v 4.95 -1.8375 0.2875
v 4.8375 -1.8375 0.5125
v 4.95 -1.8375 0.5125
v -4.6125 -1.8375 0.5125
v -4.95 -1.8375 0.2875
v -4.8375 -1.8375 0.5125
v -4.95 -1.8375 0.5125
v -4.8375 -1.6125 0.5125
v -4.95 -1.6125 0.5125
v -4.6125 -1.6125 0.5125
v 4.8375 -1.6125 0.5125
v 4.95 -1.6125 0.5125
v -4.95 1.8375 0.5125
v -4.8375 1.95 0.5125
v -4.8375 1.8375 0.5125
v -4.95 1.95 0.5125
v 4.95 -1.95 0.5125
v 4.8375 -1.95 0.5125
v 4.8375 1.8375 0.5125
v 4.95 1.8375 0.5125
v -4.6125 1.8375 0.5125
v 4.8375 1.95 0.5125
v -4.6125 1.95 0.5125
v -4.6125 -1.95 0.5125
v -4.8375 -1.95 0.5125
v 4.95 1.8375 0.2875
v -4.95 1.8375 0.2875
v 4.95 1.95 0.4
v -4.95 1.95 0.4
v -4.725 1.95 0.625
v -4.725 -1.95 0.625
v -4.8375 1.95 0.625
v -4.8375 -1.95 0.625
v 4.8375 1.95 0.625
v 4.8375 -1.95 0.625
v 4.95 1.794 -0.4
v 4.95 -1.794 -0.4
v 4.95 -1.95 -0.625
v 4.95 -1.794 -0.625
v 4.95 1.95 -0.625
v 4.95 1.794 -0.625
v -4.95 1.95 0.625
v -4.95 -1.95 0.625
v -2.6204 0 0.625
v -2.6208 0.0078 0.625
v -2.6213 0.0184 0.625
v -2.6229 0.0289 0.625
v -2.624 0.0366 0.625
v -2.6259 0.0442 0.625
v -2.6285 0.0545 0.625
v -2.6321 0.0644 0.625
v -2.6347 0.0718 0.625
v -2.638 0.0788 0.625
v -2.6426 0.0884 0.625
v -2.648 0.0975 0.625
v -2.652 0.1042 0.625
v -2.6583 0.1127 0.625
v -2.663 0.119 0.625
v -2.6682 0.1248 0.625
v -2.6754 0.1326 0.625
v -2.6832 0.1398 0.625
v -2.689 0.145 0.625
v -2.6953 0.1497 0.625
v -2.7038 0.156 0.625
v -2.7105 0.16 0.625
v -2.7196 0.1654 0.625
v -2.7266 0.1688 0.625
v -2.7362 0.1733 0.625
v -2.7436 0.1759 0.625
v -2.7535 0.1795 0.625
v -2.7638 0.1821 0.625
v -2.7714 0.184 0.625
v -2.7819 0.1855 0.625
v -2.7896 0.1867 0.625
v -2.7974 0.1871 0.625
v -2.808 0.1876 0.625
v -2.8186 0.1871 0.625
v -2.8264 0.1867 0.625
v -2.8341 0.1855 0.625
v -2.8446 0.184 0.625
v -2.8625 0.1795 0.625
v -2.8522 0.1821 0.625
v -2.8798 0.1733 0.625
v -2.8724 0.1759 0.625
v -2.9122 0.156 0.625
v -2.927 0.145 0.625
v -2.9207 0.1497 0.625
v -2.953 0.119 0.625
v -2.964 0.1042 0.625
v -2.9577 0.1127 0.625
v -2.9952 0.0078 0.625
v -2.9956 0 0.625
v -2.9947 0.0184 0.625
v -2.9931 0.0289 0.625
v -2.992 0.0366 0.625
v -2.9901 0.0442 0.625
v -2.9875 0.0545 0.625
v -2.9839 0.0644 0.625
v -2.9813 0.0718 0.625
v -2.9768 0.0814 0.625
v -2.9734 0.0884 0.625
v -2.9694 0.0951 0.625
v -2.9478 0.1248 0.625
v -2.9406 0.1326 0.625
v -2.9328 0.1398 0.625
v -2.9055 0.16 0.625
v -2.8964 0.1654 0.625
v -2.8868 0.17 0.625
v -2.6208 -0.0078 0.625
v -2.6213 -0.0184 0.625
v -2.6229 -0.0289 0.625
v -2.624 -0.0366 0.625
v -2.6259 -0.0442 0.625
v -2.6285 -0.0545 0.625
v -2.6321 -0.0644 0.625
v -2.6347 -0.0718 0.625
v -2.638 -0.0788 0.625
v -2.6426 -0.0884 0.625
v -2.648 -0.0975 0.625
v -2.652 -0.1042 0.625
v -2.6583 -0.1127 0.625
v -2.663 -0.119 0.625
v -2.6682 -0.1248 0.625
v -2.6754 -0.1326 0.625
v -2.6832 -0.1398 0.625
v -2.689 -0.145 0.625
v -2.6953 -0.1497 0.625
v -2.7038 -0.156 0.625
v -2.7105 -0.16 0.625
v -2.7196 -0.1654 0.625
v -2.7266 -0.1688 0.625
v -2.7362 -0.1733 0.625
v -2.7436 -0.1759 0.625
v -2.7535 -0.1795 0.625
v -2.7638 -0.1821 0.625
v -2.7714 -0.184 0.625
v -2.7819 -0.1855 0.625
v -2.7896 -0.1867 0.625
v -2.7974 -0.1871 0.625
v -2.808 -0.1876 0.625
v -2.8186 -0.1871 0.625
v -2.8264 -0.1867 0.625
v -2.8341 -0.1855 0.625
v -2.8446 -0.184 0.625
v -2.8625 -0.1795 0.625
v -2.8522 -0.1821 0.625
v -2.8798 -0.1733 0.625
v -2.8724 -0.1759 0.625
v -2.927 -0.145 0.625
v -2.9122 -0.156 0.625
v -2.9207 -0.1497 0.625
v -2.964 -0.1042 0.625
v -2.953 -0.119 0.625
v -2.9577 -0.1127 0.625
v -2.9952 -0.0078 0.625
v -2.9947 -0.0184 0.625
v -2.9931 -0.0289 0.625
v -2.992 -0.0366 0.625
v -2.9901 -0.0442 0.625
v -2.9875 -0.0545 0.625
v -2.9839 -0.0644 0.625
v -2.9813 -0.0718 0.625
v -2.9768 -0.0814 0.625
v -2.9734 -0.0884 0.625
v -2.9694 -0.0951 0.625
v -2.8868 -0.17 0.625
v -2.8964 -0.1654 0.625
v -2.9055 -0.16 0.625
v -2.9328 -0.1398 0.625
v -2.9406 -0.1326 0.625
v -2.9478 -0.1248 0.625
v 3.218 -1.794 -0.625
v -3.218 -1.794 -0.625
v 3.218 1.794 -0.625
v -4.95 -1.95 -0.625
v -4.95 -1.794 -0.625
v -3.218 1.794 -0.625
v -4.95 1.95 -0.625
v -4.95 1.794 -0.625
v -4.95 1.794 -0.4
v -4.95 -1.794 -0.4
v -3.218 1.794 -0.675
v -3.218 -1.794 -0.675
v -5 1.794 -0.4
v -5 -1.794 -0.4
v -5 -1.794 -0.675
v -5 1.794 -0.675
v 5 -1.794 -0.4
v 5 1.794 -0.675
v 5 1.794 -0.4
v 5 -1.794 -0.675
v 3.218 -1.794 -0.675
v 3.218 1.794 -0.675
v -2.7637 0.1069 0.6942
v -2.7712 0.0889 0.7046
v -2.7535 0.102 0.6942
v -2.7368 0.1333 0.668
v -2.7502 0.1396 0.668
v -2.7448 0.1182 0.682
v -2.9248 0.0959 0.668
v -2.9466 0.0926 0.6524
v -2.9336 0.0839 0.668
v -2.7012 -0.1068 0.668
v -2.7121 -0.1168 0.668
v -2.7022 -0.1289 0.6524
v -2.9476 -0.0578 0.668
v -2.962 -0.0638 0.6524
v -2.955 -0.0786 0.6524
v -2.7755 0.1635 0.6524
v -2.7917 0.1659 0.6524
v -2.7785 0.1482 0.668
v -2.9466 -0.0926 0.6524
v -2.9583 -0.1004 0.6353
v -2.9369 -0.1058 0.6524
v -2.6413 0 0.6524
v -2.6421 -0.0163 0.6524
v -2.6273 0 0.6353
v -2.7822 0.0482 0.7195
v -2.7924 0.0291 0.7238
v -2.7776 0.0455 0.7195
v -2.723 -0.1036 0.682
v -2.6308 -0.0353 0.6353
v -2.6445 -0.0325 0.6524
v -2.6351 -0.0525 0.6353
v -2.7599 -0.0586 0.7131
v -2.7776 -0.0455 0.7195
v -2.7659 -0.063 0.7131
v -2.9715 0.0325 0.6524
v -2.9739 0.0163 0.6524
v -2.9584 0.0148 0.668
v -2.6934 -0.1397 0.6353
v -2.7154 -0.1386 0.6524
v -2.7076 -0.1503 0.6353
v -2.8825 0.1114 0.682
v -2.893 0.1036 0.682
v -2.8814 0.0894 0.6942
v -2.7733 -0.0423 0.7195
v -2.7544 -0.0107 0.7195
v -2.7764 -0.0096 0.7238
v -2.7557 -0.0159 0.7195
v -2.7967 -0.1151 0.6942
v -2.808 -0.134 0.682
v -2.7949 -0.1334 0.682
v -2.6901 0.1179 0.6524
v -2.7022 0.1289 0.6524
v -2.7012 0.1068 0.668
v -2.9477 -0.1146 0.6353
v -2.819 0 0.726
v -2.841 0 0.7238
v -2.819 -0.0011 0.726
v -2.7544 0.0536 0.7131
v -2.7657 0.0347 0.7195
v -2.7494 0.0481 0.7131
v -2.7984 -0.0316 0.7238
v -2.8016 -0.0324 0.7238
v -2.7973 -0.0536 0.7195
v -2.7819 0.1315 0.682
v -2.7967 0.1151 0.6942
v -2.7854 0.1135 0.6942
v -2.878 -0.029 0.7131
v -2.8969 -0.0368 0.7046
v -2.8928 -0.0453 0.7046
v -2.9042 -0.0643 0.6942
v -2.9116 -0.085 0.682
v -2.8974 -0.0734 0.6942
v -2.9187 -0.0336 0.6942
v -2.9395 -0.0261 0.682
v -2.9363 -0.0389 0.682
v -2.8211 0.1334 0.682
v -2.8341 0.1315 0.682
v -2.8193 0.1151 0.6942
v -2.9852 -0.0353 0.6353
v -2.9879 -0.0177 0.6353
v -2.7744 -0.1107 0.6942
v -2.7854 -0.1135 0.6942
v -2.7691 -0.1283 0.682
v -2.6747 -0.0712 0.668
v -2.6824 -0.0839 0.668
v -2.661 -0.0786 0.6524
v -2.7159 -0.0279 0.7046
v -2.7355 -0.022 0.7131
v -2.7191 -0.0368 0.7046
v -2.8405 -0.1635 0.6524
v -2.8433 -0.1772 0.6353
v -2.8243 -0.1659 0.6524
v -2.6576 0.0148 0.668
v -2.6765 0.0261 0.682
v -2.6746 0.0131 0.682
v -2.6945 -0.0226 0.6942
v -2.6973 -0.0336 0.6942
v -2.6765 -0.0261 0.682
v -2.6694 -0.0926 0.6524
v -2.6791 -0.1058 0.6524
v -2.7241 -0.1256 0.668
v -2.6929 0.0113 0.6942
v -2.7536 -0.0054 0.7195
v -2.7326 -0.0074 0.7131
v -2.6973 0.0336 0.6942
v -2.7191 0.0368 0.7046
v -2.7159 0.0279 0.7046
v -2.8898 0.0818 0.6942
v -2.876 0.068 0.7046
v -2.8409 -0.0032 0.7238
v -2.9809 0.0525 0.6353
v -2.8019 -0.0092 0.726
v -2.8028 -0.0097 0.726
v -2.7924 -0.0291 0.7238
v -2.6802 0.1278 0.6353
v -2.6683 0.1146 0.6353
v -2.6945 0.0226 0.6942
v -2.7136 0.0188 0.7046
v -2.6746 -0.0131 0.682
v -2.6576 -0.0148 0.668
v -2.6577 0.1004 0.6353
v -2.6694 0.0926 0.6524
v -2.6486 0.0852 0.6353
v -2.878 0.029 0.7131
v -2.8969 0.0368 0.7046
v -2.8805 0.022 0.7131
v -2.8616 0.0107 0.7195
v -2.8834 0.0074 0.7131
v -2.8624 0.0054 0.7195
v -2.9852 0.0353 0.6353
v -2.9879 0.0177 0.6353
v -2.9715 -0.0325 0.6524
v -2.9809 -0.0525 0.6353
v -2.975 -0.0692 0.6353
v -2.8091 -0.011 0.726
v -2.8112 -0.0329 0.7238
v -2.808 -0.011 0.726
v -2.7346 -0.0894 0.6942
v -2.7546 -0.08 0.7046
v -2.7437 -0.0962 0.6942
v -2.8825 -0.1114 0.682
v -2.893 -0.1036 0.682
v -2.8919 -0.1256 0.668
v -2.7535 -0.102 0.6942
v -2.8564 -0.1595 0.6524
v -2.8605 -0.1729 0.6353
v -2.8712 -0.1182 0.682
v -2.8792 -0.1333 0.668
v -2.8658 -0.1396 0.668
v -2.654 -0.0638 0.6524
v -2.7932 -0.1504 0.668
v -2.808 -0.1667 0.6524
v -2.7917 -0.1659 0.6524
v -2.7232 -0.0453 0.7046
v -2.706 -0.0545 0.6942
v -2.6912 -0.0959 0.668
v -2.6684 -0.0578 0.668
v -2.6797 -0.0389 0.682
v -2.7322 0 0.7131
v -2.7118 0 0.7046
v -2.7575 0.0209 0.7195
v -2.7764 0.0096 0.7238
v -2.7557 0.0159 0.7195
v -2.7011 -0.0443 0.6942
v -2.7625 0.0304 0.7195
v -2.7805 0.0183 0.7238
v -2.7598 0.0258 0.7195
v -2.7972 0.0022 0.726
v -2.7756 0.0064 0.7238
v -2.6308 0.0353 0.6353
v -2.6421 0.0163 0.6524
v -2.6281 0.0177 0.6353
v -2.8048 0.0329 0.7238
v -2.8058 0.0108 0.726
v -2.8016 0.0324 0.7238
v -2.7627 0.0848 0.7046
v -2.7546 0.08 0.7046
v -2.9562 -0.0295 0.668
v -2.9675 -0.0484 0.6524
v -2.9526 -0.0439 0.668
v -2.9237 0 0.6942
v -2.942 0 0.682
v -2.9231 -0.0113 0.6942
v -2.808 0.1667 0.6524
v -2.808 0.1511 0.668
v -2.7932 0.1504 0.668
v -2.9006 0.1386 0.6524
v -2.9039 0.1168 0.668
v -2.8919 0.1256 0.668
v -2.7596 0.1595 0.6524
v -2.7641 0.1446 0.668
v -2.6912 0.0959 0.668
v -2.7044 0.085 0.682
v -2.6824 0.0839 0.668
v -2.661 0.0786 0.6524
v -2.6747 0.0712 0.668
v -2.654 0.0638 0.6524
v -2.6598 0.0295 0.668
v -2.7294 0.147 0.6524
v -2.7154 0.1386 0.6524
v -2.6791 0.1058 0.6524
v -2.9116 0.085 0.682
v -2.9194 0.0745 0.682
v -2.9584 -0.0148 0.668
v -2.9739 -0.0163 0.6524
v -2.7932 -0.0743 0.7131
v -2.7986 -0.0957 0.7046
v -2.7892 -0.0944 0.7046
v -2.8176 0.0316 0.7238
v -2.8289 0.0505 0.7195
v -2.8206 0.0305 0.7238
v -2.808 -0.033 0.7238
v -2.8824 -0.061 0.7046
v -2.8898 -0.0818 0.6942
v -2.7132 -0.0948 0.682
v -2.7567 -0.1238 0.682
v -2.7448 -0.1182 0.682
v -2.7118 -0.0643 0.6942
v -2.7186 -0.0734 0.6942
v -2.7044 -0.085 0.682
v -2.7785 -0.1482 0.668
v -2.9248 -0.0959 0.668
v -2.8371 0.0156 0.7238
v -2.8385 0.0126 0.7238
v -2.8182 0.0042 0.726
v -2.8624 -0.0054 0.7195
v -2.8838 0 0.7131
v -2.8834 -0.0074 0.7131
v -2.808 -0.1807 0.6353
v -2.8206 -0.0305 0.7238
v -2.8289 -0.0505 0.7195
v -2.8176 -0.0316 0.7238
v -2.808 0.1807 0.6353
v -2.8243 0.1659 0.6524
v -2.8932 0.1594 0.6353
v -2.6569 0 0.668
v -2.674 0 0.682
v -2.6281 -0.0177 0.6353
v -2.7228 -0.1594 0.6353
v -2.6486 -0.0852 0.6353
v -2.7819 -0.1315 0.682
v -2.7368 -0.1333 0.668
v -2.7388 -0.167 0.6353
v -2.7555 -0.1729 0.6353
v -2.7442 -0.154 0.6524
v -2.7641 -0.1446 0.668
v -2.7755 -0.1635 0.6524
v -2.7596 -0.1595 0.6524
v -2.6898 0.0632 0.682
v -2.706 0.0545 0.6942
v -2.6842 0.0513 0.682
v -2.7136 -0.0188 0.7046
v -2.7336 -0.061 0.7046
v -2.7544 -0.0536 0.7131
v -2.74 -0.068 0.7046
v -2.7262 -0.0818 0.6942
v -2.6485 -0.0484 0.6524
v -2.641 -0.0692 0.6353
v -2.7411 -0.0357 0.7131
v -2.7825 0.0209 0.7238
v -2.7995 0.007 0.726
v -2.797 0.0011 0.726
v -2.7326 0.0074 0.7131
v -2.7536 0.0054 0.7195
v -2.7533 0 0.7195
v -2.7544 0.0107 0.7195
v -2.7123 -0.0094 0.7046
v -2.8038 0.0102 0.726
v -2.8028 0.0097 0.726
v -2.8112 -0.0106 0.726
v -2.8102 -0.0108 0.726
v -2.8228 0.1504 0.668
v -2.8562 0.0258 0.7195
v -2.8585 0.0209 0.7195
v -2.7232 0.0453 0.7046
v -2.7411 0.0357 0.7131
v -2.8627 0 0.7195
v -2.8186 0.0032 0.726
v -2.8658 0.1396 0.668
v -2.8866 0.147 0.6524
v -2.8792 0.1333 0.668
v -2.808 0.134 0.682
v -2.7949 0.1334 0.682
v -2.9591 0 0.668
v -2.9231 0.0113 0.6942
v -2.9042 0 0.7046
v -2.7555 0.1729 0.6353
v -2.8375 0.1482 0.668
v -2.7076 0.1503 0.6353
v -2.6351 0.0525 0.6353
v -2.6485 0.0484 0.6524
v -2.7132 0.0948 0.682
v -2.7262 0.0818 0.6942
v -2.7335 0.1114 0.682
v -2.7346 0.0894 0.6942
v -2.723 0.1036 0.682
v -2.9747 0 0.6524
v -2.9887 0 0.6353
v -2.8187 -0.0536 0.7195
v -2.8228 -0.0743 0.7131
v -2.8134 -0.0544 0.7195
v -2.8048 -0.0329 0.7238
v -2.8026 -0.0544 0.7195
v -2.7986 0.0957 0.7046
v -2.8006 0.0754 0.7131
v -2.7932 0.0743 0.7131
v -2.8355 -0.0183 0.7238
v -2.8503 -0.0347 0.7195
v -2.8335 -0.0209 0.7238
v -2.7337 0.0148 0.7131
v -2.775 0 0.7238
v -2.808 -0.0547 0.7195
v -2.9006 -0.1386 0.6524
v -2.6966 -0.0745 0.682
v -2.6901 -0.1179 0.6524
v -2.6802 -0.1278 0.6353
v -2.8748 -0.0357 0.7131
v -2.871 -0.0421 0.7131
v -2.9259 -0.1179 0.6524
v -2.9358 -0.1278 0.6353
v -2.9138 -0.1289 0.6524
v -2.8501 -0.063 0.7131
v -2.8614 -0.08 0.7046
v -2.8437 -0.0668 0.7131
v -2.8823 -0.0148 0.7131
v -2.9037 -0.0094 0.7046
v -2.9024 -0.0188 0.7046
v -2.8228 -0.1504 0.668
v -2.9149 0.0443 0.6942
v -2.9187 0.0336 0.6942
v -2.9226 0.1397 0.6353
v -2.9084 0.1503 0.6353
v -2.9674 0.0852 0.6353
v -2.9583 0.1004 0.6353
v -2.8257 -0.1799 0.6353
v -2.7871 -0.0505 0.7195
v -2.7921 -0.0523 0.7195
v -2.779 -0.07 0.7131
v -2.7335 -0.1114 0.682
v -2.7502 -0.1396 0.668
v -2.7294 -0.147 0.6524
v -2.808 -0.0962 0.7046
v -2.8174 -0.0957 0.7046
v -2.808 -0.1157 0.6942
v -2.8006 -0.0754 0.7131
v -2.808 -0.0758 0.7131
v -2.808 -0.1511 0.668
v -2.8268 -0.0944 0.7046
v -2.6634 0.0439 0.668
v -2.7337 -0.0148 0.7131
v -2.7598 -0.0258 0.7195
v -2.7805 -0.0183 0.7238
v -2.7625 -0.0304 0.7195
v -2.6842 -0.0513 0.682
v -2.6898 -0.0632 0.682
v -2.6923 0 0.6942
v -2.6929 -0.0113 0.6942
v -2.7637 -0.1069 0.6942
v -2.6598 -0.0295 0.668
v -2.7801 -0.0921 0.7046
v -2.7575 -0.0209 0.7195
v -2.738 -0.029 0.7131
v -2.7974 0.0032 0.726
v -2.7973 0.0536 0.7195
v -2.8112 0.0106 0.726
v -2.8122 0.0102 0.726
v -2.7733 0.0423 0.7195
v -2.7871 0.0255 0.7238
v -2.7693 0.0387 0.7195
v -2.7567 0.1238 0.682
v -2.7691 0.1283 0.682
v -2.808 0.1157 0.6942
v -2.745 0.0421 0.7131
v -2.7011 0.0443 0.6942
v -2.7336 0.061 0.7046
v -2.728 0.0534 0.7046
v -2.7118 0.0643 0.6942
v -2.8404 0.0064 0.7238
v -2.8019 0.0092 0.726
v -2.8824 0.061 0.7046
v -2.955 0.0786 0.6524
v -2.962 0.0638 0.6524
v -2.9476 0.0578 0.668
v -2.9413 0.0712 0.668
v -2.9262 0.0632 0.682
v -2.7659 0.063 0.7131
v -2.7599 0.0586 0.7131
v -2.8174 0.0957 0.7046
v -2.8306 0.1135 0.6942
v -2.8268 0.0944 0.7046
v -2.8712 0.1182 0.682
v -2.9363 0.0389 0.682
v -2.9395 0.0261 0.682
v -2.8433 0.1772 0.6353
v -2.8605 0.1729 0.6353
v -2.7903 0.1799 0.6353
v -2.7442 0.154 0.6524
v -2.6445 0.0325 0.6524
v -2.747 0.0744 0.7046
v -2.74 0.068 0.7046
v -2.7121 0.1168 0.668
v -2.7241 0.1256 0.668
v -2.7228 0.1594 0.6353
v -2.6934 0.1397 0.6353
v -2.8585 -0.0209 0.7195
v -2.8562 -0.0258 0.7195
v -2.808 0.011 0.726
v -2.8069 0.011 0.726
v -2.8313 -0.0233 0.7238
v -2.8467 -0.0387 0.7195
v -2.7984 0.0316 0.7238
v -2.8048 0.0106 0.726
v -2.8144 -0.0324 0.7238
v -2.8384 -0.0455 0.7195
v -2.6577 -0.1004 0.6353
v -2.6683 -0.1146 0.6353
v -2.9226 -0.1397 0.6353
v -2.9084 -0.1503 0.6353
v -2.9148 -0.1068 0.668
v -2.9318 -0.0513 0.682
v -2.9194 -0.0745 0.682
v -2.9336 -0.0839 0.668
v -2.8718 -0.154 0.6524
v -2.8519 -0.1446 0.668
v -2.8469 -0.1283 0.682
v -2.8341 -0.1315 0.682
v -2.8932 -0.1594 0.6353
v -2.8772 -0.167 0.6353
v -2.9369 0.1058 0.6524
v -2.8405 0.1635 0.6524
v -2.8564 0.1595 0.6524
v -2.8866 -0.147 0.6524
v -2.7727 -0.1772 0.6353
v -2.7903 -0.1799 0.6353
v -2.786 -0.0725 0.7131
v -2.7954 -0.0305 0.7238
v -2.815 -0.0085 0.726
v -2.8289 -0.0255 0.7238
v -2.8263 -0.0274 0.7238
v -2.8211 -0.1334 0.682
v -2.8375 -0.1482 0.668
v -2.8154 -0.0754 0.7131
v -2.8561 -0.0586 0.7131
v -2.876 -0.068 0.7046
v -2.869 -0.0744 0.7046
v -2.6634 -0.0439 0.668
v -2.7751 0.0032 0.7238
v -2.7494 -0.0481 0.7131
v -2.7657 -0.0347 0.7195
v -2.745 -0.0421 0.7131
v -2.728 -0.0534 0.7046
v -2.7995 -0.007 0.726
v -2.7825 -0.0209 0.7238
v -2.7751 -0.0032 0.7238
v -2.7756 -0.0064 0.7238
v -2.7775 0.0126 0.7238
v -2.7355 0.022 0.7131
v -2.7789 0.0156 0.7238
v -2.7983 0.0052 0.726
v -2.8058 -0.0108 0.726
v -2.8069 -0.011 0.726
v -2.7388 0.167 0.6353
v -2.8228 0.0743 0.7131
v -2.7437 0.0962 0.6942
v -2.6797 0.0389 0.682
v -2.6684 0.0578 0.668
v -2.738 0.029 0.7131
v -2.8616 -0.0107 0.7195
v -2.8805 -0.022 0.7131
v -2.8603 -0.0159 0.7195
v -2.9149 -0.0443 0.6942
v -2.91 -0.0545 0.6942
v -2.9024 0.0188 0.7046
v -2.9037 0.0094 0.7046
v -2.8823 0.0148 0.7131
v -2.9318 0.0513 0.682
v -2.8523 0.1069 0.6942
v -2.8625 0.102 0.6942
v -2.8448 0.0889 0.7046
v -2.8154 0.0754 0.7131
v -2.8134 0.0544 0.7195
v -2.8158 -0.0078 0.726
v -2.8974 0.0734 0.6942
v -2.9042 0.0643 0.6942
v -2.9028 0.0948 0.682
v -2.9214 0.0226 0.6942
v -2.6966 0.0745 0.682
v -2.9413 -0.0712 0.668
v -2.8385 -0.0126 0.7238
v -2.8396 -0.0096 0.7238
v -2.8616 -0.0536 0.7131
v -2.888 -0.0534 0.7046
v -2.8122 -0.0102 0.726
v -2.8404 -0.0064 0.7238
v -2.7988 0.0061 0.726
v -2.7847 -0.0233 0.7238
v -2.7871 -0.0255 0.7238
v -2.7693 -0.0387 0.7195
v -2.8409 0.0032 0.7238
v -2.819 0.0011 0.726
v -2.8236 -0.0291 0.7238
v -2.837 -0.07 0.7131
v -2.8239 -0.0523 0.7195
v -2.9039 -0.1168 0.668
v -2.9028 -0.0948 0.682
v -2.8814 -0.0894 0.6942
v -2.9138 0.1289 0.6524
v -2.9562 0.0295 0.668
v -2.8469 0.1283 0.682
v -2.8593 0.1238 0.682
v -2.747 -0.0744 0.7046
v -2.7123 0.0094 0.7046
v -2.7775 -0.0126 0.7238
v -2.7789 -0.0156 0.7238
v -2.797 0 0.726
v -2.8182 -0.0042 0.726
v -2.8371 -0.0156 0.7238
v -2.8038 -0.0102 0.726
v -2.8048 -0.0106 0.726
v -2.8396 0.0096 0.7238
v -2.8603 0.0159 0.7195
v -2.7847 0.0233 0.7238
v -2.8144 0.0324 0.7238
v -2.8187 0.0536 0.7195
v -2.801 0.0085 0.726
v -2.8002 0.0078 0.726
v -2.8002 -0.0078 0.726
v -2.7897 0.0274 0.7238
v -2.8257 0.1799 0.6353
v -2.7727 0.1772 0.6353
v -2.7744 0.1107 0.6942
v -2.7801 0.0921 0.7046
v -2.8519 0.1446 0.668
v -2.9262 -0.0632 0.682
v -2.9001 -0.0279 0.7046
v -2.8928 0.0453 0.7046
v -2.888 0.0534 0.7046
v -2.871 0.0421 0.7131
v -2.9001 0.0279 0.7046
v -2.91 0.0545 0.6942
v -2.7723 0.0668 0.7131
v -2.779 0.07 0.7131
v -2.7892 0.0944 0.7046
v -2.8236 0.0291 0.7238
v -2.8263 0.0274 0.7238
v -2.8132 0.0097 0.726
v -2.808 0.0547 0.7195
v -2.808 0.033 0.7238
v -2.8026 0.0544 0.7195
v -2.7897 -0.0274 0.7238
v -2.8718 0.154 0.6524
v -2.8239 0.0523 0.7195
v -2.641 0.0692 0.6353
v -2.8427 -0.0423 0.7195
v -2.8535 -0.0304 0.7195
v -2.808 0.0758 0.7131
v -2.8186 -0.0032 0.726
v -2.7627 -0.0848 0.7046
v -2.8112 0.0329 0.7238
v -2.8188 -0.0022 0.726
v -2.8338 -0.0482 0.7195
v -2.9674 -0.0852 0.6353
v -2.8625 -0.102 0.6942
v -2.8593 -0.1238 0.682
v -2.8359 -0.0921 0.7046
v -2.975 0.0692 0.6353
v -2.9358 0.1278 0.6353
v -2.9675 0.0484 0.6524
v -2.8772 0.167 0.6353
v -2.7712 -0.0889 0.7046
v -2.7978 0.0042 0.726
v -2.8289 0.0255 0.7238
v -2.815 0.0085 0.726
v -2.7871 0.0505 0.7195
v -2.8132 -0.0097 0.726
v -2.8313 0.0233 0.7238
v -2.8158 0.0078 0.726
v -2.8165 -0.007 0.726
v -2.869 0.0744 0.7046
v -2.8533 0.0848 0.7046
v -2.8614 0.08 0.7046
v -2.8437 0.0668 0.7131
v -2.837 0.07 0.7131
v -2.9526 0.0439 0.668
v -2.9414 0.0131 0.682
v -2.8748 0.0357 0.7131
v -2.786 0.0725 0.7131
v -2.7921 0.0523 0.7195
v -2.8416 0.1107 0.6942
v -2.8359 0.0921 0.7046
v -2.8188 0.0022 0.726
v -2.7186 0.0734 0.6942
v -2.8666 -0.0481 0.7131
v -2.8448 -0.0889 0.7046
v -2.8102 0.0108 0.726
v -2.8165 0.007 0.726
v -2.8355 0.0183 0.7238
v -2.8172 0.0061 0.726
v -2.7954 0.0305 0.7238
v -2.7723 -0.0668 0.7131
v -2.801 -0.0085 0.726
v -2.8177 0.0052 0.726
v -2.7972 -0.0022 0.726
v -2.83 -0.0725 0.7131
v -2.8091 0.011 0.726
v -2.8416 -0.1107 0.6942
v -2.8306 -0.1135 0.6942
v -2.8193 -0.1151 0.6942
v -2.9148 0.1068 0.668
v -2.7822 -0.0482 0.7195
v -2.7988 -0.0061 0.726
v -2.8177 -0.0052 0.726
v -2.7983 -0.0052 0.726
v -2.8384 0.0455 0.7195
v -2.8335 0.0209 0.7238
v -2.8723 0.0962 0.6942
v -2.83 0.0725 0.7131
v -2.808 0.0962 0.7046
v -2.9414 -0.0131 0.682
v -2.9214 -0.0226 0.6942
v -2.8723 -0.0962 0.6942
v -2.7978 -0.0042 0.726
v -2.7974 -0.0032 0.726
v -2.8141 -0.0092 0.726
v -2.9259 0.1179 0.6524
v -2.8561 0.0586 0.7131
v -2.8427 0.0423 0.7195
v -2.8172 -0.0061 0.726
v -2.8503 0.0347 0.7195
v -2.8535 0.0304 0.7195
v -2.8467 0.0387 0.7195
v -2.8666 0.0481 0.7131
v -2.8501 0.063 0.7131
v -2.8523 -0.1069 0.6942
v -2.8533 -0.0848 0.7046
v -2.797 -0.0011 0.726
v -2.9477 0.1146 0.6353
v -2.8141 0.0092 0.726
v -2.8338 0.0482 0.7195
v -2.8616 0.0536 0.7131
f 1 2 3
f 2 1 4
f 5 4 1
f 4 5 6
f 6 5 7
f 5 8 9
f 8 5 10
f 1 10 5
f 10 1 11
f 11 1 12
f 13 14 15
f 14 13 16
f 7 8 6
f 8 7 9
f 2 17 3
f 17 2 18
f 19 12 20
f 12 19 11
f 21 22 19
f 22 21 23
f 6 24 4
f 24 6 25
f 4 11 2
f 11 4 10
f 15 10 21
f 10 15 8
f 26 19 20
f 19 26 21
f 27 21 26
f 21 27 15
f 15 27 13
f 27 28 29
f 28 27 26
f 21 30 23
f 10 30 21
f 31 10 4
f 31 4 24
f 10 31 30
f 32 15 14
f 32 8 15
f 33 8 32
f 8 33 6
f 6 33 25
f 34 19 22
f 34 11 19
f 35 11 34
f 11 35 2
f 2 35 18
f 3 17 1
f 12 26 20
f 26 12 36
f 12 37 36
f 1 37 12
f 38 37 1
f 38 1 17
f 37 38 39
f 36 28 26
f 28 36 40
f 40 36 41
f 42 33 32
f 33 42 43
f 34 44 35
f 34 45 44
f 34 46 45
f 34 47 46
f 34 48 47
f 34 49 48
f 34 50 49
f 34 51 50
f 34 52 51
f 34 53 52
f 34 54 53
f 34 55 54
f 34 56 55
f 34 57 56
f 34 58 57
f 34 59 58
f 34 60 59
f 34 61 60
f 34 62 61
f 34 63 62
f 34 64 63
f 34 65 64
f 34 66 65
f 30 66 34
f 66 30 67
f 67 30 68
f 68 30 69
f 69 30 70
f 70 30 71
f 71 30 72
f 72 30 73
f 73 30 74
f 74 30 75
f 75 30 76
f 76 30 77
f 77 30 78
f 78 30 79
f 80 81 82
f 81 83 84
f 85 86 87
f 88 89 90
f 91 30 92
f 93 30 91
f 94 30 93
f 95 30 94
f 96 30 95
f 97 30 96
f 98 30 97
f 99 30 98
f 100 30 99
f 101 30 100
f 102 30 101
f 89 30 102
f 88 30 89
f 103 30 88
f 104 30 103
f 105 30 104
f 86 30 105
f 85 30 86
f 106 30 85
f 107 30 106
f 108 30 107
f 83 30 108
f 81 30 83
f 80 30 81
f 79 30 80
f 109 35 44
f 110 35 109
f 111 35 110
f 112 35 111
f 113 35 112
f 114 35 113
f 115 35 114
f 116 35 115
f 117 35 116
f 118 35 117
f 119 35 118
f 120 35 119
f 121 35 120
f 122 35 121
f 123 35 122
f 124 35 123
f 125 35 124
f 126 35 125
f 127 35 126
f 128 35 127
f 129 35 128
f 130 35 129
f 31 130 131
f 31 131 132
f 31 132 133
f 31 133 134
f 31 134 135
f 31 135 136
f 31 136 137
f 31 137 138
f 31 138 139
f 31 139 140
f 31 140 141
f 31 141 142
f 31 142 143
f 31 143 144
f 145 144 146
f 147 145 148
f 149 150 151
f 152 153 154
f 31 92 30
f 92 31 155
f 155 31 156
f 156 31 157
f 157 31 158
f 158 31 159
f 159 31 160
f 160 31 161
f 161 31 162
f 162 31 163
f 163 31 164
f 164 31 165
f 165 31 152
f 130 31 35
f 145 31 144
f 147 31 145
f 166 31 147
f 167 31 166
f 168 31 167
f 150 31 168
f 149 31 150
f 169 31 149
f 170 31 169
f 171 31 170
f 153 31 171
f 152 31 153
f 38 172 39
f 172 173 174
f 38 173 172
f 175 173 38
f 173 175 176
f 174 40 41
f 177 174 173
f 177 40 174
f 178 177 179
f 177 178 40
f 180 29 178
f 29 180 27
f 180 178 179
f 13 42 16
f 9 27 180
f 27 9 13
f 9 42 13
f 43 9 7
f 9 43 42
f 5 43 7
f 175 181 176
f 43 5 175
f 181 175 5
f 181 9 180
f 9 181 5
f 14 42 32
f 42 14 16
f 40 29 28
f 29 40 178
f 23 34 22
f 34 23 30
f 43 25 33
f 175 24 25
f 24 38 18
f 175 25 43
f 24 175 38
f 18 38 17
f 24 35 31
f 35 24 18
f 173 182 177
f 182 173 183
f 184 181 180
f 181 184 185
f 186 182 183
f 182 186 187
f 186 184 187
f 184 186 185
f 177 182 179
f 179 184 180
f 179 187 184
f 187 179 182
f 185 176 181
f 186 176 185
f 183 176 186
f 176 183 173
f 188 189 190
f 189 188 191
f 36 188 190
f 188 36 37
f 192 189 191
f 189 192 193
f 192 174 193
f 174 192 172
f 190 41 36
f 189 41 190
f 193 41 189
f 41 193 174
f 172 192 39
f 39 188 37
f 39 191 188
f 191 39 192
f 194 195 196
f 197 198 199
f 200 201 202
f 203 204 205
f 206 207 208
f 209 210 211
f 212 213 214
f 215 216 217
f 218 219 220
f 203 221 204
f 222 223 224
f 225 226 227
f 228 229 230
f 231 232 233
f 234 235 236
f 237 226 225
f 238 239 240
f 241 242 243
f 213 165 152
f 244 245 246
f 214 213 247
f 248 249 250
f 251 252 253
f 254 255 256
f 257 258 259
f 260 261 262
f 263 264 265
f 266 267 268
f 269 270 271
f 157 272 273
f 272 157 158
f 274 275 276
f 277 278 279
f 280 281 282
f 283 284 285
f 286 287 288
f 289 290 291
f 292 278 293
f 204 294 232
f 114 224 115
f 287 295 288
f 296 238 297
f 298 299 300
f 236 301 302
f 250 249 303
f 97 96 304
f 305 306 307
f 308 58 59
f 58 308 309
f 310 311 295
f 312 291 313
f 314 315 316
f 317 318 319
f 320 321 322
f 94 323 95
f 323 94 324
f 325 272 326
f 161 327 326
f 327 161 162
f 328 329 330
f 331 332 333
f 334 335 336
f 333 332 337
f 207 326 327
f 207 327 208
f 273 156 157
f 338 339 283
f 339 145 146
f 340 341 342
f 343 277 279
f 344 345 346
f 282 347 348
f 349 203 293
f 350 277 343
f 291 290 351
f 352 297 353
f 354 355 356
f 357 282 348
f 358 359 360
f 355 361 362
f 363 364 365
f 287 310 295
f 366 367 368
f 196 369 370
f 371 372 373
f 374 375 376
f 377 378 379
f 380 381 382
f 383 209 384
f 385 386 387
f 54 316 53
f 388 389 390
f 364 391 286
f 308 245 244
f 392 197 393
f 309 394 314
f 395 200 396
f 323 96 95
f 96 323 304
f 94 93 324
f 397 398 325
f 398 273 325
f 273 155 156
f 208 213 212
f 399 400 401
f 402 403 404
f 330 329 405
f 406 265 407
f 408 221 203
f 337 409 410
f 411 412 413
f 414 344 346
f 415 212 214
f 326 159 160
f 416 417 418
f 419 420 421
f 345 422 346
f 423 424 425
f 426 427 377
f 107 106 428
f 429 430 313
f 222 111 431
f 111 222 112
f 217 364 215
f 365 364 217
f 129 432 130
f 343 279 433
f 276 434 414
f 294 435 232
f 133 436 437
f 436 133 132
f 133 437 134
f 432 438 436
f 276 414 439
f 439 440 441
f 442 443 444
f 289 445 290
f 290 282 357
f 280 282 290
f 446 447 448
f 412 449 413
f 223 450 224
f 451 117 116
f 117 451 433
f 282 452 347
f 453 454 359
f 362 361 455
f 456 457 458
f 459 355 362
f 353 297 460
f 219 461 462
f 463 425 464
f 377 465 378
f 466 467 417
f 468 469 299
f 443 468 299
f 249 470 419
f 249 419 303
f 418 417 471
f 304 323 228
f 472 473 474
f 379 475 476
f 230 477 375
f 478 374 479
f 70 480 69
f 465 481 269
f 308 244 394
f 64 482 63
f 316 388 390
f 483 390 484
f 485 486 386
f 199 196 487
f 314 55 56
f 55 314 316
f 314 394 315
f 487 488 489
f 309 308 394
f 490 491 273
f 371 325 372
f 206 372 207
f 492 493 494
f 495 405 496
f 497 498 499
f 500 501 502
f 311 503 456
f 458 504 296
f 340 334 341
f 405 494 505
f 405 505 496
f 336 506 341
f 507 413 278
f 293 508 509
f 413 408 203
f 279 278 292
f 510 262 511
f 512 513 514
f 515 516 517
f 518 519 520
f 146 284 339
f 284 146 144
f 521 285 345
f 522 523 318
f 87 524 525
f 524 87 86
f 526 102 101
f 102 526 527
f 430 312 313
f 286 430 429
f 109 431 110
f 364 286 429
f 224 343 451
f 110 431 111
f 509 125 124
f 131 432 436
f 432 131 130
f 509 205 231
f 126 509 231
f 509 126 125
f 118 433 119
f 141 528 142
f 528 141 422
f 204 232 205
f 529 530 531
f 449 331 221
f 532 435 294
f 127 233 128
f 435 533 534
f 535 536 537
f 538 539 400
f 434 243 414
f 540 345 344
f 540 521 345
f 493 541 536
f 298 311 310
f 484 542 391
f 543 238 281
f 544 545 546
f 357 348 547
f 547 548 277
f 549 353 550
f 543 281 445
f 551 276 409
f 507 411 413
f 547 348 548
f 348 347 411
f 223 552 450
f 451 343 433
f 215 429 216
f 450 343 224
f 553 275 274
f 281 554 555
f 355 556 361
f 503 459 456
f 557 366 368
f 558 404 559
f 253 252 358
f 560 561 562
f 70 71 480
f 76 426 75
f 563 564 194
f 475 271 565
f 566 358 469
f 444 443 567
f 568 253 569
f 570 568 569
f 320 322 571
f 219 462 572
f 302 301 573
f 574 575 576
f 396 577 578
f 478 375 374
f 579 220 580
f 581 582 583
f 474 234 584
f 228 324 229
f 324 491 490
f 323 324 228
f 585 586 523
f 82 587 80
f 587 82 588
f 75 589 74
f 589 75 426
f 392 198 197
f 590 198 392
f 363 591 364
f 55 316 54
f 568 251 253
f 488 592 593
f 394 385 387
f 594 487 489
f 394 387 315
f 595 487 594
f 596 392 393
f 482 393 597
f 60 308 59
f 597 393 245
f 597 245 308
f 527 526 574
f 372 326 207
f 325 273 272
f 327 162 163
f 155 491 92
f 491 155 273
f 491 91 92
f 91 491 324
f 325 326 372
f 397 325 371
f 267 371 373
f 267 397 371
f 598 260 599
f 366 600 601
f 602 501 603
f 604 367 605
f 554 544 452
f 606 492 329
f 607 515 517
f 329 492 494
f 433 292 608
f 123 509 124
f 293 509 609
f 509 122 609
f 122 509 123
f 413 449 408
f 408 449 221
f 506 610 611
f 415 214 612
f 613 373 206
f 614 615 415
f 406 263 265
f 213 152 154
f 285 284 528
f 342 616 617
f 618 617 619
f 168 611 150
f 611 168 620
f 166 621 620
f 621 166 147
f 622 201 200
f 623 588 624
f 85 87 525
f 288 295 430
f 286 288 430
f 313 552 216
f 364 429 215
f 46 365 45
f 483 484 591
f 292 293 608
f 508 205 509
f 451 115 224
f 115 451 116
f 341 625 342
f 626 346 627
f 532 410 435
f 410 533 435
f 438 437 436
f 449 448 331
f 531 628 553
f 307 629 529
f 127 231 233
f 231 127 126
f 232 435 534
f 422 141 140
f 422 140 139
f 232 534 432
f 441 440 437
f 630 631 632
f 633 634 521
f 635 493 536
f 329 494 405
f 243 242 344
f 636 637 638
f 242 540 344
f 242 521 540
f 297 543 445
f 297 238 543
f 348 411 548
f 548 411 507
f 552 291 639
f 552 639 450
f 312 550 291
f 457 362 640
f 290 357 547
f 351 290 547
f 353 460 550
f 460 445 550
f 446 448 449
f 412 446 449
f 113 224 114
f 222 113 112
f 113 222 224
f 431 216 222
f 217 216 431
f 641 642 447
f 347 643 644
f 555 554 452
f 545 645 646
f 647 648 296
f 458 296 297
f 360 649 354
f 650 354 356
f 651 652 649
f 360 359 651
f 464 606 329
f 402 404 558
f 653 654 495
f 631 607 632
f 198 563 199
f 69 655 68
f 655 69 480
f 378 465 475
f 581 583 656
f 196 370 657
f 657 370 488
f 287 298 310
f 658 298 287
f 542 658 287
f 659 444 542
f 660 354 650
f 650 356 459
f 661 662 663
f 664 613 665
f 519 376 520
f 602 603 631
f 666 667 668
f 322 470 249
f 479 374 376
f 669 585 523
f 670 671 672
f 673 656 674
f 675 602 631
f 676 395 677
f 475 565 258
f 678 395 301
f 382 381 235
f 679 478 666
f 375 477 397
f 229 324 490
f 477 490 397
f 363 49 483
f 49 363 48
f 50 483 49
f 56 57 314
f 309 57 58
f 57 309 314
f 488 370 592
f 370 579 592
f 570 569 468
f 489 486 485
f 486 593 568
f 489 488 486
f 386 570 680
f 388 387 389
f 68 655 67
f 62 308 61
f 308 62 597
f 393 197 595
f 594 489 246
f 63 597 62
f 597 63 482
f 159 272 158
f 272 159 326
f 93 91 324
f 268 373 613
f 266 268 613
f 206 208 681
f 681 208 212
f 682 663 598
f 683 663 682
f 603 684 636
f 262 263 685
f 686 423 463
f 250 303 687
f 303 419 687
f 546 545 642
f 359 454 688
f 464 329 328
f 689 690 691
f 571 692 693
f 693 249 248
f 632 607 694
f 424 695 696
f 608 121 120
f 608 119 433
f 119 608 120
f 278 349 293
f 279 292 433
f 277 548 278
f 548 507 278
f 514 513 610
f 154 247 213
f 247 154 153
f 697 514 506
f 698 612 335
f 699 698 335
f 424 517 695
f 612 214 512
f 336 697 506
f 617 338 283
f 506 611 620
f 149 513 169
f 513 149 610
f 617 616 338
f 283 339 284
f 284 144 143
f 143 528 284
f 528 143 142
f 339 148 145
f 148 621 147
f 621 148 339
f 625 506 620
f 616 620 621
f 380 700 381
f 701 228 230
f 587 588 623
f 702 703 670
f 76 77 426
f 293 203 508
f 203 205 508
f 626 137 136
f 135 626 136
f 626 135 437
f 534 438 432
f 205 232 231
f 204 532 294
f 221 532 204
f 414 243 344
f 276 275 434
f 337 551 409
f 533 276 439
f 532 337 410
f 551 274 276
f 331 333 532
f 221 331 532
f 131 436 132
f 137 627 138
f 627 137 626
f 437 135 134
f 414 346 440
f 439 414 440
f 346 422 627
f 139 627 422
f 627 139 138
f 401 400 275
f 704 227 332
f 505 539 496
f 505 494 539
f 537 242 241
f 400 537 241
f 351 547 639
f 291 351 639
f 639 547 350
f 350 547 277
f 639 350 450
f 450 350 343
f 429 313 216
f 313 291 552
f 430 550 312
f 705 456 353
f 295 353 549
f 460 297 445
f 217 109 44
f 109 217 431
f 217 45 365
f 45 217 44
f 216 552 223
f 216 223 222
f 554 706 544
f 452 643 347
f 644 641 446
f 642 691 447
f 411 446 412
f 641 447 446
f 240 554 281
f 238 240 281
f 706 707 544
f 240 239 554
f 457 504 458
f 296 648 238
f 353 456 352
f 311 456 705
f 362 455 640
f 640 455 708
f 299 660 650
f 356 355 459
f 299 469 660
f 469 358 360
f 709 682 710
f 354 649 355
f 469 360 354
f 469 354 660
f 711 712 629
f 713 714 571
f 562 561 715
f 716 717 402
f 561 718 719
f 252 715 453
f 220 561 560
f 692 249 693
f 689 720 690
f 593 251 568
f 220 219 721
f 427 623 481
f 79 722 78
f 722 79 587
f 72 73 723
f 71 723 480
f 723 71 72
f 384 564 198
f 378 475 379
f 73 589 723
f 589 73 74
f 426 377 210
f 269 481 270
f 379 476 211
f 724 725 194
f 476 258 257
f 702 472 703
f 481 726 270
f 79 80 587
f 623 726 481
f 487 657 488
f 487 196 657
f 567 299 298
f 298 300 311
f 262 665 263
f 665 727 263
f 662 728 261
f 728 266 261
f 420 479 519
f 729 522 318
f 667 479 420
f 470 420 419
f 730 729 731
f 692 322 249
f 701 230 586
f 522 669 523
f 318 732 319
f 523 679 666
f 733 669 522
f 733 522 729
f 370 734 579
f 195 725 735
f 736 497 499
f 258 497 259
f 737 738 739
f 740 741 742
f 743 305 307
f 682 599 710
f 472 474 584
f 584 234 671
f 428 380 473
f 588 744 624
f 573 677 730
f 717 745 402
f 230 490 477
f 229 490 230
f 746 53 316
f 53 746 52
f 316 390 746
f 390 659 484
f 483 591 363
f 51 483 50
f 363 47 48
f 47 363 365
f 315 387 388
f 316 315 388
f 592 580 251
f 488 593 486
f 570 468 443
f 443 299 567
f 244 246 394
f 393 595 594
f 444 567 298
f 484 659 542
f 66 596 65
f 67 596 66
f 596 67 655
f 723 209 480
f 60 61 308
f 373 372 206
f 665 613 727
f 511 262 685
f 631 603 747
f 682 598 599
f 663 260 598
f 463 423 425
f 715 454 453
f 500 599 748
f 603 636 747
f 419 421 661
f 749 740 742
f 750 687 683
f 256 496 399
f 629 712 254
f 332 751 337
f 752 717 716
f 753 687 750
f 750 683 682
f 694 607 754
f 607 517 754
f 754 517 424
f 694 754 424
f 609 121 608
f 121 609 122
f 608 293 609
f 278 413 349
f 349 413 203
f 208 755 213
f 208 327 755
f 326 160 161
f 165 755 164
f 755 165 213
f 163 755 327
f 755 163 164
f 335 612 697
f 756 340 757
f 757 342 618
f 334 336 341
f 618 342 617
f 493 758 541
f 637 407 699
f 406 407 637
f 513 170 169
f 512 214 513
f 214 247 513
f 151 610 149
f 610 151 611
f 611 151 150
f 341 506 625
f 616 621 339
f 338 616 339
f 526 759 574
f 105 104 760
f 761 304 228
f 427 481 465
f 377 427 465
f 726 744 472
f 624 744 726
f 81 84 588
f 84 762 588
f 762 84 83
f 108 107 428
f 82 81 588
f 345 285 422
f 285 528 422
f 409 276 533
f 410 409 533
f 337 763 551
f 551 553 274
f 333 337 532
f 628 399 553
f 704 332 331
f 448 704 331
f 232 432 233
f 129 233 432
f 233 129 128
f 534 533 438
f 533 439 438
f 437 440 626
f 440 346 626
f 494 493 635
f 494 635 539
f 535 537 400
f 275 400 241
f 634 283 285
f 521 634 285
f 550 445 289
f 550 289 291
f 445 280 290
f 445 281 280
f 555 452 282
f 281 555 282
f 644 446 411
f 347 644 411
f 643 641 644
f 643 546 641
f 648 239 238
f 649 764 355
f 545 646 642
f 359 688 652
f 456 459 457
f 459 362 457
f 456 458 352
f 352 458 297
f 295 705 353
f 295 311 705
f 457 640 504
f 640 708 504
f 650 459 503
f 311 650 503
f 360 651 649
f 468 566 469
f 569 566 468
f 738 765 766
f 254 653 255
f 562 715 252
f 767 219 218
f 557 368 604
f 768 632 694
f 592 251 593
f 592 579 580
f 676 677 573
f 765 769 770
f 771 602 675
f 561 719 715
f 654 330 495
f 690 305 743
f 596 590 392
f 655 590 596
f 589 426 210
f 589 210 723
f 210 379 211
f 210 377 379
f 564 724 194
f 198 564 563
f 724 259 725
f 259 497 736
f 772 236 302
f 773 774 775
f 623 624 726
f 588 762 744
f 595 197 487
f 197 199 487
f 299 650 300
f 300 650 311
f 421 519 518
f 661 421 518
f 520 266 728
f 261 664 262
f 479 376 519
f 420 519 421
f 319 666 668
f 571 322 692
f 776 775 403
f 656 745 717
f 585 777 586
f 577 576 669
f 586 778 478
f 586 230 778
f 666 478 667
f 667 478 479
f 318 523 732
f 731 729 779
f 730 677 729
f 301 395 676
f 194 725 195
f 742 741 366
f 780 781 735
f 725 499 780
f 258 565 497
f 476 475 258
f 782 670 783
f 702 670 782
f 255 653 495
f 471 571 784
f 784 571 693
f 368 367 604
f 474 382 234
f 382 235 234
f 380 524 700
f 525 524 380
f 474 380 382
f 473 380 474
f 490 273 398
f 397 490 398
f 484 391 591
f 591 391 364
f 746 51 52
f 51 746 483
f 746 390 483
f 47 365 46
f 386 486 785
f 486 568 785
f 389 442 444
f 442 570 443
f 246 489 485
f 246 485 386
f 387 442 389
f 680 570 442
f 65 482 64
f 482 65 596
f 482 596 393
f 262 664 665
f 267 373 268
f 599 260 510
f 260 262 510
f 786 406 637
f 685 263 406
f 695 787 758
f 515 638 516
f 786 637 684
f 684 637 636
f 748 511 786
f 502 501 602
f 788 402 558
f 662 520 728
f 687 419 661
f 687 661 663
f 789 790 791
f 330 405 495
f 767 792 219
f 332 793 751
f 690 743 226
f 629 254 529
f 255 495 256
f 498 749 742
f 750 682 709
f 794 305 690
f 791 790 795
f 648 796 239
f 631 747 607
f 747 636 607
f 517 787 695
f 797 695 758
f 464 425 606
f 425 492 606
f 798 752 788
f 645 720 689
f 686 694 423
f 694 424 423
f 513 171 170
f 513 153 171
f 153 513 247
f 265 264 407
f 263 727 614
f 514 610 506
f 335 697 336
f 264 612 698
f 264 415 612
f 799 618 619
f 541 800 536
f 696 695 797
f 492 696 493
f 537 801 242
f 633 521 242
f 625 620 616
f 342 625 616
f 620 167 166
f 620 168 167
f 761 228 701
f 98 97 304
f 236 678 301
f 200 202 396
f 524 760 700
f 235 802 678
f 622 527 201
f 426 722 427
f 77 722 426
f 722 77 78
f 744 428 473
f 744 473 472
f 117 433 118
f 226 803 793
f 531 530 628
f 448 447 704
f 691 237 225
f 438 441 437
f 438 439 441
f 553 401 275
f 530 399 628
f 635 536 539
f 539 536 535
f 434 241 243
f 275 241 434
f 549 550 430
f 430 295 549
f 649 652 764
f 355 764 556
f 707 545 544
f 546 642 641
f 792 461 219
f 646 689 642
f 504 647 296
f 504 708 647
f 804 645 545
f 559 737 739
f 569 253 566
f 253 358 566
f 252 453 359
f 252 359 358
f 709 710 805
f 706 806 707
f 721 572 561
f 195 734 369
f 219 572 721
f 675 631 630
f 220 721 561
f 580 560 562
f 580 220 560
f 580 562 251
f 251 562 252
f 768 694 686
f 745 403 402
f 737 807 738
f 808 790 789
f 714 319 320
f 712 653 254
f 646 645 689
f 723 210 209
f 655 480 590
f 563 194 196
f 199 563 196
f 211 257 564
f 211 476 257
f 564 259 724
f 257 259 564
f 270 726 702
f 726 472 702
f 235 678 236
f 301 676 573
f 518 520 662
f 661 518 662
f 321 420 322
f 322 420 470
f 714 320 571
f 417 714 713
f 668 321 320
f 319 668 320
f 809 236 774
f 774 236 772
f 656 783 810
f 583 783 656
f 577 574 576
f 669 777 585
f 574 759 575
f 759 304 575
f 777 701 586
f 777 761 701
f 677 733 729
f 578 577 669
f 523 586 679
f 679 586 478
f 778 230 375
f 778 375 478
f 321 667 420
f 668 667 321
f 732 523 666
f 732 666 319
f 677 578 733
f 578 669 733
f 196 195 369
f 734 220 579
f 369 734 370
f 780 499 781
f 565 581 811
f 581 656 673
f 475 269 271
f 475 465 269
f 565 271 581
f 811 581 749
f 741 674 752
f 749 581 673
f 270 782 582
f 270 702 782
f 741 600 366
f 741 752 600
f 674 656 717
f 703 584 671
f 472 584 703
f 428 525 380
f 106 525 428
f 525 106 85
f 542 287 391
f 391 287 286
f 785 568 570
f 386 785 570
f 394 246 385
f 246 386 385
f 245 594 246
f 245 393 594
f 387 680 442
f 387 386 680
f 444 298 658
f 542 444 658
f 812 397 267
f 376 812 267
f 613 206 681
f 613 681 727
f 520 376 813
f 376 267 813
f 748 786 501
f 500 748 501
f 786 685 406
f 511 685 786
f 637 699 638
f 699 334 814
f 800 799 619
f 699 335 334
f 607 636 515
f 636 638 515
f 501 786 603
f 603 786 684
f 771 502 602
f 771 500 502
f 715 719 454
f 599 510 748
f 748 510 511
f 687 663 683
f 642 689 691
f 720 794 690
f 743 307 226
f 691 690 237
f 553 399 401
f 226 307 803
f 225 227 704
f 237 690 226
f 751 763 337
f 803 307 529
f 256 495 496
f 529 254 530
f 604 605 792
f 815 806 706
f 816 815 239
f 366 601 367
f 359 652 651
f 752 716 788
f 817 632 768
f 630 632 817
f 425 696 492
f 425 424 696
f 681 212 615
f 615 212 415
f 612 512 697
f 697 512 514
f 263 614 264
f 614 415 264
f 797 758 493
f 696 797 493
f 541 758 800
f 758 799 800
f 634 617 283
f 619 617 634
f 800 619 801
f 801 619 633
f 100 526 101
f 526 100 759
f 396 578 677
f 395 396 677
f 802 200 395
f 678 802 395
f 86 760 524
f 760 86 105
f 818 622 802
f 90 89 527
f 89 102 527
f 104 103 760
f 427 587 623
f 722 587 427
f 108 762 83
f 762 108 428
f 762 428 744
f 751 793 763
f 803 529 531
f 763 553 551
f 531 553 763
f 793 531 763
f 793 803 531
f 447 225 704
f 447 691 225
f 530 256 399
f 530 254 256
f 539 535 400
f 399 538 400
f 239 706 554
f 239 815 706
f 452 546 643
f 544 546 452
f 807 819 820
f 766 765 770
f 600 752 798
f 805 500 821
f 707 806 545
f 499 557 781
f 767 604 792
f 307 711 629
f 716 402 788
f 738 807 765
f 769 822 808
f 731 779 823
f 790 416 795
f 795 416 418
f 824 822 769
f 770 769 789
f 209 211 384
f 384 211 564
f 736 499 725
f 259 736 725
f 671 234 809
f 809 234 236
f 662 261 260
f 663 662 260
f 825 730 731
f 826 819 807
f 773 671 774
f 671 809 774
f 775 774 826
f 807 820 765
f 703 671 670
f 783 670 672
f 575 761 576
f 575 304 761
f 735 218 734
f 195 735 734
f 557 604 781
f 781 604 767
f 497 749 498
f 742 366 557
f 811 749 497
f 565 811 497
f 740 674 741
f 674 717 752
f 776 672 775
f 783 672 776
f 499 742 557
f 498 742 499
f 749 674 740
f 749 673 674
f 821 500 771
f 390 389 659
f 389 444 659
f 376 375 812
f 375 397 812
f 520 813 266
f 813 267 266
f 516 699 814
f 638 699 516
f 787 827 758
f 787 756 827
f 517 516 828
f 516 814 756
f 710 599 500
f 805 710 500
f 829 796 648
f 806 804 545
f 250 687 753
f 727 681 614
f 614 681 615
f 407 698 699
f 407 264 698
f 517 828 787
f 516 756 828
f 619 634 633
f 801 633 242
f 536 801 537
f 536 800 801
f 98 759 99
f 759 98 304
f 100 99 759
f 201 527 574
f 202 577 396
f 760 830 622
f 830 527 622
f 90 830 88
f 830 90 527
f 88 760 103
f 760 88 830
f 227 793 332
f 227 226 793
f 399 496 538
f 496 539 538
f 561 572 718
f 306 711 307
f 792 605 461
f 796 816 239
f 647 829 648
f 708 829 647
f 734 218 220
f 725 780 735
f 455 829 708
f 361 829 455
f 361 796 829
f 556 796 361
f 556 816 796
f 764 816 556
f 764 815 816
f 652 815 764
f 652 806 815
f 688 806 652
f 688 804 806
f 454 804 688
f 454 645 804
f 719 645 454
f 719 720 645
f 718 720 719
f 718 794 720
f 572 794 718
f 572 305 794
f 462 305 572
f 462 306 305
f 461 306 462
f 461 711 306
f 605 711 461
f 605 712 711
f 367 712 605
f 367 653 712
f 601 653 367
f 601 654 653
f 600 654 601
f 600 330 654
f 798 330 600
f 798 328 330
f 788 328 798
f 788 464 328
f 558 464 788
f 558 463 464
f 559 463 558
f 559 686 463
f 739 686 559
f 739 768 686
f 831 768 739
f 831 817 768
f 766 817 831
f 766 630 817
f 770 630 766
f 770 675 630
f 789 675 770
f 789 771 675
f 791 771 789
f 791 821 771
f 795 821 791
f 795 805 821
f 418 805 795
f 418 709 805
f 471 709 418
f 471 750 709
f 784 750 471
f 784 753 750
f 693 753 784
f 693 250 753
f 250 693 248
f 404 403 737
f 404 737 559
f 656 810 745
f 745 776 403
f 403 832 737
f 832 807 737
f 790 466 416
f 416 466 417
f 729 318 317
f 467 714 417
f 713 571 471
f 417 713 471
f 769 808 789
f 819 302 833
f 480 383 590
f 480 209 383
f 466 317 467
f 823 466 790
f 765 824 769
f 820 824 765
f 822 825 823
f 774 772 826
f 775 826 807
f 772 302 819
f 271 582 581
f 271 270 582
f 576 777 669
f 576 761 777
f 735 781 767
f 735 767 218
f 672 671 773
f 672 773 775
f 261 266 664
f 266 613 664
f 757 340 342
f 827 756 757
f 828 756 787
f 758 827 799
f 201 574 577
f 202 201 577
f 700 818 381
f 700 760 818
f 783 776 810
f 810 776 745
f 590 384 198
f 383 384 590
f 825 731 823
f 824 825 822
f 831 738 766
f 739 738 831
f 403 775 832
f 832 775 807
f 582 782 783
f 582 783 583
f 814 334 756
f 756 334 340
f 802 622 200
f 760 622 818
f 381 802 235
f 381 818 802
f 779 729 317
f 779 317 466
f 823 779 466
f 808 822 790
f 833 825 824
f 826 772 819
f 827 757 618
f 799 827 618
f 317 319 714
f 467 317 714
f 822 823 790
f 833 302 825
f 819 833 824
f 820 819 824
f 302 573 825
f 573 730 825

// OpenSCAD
$fn = 64;

// Overall SMD envelope (L, W, H)
size = [9.90, 3.90, 1.25];
L = size[0];
W = size[1];
H = size[2];

// Simple SMD-style details (all derived from dimensions)
pad_len = L * 0.18;
pad_thk = H * 0.22;
pad_w   = W * 0.92;

chamfer = min(H * 0.18, W * 0.12);
overlap = min(0.05, H * 0.08); // small overlap to guarantee one connected solid

module chamfered_body(l, w, h, c) {
    // Create top-edge chamfers by subtracting wedges; keep overall envelope
    difference() {
        cube([l, w, h], center=true);

        // Long-side top chamfers (along X)
        for (sy = [-1, 1]) {
            translate([0, sy*(w/2 - c/2), h/2 - c/2])
                rotate([0, 90, 0])
                    linear_extrude(height=l + 2*overlap, center=true)
                        polygon(points=[[0,0],[c,0],[0,c]]);
        }

        // Short-side top chamfers (along Y)
        for (sx = [-1, 1]) {
            translate([sx*(l/2 - c/2), 0, h/2 - c/2])
                rotate([90, 0, 0])
                    linear_extrude(height=w + 2*overlap, center=true)
                        polygon(points=[[0,0],[c,0],[0,c]]);
        }
    }
}

union() {
    // Main body (chamfered)
    chamfered_body(L, W, H, chamfer);

    // End terminals/pads (connected with slight overlap into body)
    for (sx = [-1, 1]) {
        translate([sx*(L/2 - pad_len/2 + overlap), 0, -H/2 + pad_thk/2 - overlap])
            cube([pad_len, pad_w, pad_thk], center=true);
    }

    // Polarity/Pin-1 style mark: shallow top dimple near one end (added, not subtracted)
    mark_r = min(W, H) * 0.18;
    translate([-L/2 + pad_len + mark_r*1.6, 0, H/2 - mark_r*0.55])
        sphere(r=mark_r);
}
